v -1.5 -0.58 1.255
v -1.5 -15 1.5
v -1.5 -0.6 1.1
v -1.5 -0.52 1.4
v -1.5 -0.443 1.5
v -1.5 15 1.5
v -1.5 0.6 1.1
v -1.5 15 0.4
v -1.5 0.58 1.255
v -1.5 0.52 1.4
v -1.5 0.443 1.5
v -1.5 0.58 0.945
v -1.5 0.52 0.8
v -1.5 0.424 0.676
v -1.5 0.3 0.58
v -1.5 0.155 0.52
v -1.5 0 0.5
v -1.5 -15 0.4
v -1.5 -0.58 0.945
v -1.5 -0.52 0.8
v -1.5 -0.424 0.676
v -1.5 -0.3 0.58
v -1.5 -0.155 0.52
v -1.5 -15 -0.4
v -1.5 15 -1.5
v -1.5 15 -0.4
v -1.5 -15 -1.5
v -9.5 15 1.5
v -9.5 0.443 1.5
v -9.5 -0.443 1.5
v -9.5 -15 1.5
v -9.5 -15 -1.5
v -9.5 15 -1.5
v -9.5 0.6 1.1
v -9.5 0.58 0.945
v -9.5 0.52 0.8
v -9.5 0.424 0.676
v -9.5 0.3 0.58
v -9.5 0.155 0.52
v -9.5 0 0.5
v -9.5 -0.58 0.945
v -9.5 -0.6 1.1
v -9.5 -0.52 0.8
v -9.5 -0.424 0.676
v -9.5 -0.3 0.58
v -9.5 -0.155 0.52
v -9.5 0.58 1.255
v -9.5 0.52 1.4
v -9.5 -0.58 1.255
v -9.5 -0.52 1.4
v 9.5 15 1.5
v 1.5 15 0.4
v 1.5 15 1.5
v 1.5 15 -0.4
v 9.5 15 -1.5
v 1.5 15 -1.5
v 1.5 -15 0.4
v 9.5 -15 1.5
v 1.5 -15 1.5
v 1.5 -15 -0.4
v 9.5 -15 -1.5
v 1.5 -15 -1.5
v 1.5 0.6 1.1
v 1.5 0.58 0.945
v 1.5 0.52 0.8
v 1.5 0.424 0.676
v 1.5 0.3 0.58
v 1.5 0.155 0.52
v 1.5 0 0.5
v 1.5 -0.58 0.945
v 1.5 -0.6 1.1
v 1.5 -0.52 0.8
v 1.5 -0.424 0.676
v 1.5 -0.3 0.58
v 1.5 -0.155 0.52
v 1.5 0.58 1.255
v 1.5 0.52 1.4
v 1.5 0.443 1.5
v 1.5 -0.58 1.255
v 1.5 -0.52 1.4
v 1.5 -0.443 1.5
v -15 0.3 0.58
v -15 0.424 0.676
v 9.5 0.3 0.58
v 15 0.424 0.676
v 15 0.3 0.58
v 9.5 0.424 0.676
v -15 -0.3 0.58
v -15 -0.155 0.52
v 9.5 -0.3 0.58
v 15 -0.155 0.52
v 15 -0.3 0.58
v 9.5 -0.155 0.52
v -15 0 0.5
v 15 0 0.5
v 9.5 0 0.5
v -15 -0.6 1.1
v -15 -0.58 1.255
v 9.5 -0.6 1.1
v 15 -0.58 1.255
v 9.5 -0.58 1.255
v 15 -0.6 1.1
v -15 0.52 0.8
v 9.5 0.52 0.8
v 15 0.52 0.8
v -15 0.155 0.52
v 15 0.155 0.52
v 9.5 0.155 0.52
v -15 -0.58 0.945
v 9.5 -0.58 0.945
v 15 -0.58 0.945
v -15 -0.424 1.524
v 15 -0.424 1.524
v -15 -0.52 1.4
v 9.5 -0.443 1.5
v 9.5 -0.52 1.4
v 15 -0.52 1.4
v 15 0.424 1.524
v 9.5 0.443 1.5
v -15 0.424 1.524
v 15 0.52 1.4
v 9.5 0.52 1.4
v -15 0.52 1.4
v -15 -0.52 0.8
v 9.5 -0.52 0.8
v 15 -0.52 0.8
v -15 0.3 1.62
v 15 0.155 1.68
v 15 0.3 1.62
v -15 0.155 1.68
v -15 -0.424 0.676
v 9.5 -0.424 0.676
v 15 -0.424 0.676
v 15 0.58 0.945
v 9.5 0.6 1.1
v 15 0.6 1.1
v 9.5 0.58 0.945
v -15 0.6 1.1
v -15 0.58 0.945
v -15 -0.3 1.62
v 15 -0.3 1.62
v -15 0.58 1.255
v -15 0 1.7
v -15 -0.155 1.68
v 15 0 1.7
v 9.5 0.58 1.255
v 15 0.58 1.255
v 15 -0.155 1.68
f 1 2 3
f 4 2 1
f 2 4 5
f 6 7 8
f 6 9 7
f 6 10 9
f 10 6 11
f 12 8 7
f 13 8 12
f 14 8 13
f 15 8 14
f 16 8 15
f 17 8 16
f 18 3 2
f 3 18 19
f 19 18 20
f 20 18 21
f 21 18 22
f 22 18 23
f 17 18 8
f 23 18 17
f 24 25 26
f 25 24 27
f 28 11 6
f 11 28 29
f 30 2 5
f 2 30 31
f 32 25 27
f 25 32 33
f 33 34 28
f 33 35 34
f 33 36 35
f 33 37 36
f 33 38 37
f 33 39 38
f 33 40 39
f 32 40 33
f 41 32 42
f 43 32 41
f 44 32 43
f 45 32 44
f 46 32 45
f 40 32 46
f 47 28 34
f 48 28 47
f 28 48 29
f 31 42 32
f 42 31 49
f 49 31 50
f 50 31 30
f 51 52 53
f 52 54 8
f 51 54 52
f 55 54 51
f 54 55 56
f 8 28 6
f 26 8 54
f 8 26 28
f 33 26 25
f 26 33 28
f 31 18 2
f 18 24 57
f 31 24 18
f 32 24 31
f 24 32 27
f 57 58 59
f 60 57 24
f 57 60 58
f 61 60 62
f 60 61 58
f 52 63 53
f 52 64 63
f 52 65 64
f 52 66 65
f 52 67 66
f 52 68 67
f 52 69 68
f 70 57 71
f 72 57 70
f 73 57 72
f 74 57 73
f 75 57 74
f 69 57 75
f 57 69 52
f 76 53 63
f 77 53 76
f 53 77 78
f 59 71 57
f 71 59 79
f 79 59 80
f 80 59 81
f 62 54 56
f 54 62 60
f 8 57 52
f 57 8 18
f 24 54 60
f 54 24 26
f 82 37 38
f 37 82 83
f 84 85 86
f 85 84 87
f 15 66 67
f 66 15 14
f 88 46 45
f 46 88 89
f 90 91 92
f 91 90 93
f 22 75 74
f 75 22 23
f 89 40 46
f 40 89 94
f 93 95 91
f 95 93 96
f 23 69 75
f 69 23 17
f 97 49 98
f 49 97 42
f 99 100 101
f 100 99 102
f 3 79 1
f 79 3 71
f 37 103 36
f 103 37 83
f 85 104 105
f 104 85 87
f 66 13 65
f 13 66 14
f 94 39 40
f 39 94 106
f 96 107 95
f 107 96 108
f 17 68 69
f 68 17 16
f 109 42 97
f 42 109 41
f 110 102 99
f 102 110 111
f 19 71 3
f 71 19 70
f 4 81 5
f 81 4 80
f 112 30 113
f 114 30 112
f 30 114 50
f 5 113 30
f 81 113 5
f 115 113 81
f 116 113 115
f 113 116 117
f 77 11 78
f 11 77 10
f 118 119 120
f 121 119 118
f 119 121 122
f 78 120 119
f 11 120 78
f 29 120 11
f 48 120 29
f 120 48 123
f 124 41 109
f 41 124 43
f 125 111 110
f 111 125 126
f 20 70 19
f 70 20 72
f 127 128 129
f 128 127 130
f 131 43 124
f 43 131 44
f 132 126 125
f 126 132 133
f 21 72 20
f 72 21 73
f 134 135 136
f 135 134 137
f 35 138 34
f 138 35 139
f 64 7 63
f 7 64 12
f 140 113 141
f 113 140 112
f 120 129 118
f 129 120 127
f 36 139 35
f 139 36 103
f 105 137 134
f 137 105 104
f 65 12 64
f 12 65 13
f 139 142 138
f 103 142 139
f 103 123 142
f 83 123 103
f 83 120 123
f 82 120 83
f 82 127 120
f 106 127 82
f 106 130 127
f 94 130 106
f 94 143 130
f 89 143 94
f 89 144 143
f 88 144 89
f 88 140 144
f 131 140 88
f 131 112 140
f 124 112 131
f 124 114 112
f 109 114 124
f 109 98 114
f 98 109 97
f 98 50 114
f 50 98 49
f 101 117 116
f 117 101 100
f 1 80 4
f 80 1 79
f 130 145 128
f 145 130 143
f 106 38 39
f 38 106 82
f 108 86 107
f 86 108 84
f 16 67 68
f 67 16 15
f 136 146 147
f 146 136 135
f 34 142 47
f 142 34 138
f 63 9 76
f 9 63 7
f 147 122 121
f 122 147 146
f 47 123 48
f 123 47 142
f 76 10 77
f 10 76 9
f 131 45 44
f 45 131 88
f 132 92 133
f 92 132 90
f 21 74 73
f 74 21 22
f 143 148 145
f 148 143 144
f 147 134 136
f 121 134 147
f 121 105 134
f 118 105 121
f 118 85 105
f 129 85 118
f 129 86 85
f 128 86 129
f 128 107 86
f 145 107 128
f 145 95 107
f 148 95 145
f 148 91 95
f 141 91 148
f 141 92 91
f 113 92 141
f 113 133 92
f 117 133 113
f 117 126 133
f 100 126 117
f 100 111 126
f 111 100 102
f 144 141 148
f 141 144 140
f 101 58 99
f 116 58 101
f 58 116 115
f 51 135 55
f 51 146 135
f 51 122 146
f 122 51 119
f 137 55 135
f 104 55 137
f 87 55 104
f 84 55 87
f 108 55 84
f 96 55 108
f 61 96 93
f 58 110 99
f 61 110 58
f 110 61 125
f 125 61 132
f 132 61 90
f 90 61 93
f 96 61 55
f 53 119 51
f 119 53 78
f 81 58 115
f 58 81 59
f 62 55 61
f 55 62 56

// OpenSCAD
include <../hinge_library.scad>

snap_lid_hinge(
    width          = 30,
    box_leaf_len   = 8,
    lid_leaf_len   = 8,
    leaf_thickness = 3,
    web_length     = 3,
    web_thickness  = 0.8,
    bump_r         = 0.6
);
